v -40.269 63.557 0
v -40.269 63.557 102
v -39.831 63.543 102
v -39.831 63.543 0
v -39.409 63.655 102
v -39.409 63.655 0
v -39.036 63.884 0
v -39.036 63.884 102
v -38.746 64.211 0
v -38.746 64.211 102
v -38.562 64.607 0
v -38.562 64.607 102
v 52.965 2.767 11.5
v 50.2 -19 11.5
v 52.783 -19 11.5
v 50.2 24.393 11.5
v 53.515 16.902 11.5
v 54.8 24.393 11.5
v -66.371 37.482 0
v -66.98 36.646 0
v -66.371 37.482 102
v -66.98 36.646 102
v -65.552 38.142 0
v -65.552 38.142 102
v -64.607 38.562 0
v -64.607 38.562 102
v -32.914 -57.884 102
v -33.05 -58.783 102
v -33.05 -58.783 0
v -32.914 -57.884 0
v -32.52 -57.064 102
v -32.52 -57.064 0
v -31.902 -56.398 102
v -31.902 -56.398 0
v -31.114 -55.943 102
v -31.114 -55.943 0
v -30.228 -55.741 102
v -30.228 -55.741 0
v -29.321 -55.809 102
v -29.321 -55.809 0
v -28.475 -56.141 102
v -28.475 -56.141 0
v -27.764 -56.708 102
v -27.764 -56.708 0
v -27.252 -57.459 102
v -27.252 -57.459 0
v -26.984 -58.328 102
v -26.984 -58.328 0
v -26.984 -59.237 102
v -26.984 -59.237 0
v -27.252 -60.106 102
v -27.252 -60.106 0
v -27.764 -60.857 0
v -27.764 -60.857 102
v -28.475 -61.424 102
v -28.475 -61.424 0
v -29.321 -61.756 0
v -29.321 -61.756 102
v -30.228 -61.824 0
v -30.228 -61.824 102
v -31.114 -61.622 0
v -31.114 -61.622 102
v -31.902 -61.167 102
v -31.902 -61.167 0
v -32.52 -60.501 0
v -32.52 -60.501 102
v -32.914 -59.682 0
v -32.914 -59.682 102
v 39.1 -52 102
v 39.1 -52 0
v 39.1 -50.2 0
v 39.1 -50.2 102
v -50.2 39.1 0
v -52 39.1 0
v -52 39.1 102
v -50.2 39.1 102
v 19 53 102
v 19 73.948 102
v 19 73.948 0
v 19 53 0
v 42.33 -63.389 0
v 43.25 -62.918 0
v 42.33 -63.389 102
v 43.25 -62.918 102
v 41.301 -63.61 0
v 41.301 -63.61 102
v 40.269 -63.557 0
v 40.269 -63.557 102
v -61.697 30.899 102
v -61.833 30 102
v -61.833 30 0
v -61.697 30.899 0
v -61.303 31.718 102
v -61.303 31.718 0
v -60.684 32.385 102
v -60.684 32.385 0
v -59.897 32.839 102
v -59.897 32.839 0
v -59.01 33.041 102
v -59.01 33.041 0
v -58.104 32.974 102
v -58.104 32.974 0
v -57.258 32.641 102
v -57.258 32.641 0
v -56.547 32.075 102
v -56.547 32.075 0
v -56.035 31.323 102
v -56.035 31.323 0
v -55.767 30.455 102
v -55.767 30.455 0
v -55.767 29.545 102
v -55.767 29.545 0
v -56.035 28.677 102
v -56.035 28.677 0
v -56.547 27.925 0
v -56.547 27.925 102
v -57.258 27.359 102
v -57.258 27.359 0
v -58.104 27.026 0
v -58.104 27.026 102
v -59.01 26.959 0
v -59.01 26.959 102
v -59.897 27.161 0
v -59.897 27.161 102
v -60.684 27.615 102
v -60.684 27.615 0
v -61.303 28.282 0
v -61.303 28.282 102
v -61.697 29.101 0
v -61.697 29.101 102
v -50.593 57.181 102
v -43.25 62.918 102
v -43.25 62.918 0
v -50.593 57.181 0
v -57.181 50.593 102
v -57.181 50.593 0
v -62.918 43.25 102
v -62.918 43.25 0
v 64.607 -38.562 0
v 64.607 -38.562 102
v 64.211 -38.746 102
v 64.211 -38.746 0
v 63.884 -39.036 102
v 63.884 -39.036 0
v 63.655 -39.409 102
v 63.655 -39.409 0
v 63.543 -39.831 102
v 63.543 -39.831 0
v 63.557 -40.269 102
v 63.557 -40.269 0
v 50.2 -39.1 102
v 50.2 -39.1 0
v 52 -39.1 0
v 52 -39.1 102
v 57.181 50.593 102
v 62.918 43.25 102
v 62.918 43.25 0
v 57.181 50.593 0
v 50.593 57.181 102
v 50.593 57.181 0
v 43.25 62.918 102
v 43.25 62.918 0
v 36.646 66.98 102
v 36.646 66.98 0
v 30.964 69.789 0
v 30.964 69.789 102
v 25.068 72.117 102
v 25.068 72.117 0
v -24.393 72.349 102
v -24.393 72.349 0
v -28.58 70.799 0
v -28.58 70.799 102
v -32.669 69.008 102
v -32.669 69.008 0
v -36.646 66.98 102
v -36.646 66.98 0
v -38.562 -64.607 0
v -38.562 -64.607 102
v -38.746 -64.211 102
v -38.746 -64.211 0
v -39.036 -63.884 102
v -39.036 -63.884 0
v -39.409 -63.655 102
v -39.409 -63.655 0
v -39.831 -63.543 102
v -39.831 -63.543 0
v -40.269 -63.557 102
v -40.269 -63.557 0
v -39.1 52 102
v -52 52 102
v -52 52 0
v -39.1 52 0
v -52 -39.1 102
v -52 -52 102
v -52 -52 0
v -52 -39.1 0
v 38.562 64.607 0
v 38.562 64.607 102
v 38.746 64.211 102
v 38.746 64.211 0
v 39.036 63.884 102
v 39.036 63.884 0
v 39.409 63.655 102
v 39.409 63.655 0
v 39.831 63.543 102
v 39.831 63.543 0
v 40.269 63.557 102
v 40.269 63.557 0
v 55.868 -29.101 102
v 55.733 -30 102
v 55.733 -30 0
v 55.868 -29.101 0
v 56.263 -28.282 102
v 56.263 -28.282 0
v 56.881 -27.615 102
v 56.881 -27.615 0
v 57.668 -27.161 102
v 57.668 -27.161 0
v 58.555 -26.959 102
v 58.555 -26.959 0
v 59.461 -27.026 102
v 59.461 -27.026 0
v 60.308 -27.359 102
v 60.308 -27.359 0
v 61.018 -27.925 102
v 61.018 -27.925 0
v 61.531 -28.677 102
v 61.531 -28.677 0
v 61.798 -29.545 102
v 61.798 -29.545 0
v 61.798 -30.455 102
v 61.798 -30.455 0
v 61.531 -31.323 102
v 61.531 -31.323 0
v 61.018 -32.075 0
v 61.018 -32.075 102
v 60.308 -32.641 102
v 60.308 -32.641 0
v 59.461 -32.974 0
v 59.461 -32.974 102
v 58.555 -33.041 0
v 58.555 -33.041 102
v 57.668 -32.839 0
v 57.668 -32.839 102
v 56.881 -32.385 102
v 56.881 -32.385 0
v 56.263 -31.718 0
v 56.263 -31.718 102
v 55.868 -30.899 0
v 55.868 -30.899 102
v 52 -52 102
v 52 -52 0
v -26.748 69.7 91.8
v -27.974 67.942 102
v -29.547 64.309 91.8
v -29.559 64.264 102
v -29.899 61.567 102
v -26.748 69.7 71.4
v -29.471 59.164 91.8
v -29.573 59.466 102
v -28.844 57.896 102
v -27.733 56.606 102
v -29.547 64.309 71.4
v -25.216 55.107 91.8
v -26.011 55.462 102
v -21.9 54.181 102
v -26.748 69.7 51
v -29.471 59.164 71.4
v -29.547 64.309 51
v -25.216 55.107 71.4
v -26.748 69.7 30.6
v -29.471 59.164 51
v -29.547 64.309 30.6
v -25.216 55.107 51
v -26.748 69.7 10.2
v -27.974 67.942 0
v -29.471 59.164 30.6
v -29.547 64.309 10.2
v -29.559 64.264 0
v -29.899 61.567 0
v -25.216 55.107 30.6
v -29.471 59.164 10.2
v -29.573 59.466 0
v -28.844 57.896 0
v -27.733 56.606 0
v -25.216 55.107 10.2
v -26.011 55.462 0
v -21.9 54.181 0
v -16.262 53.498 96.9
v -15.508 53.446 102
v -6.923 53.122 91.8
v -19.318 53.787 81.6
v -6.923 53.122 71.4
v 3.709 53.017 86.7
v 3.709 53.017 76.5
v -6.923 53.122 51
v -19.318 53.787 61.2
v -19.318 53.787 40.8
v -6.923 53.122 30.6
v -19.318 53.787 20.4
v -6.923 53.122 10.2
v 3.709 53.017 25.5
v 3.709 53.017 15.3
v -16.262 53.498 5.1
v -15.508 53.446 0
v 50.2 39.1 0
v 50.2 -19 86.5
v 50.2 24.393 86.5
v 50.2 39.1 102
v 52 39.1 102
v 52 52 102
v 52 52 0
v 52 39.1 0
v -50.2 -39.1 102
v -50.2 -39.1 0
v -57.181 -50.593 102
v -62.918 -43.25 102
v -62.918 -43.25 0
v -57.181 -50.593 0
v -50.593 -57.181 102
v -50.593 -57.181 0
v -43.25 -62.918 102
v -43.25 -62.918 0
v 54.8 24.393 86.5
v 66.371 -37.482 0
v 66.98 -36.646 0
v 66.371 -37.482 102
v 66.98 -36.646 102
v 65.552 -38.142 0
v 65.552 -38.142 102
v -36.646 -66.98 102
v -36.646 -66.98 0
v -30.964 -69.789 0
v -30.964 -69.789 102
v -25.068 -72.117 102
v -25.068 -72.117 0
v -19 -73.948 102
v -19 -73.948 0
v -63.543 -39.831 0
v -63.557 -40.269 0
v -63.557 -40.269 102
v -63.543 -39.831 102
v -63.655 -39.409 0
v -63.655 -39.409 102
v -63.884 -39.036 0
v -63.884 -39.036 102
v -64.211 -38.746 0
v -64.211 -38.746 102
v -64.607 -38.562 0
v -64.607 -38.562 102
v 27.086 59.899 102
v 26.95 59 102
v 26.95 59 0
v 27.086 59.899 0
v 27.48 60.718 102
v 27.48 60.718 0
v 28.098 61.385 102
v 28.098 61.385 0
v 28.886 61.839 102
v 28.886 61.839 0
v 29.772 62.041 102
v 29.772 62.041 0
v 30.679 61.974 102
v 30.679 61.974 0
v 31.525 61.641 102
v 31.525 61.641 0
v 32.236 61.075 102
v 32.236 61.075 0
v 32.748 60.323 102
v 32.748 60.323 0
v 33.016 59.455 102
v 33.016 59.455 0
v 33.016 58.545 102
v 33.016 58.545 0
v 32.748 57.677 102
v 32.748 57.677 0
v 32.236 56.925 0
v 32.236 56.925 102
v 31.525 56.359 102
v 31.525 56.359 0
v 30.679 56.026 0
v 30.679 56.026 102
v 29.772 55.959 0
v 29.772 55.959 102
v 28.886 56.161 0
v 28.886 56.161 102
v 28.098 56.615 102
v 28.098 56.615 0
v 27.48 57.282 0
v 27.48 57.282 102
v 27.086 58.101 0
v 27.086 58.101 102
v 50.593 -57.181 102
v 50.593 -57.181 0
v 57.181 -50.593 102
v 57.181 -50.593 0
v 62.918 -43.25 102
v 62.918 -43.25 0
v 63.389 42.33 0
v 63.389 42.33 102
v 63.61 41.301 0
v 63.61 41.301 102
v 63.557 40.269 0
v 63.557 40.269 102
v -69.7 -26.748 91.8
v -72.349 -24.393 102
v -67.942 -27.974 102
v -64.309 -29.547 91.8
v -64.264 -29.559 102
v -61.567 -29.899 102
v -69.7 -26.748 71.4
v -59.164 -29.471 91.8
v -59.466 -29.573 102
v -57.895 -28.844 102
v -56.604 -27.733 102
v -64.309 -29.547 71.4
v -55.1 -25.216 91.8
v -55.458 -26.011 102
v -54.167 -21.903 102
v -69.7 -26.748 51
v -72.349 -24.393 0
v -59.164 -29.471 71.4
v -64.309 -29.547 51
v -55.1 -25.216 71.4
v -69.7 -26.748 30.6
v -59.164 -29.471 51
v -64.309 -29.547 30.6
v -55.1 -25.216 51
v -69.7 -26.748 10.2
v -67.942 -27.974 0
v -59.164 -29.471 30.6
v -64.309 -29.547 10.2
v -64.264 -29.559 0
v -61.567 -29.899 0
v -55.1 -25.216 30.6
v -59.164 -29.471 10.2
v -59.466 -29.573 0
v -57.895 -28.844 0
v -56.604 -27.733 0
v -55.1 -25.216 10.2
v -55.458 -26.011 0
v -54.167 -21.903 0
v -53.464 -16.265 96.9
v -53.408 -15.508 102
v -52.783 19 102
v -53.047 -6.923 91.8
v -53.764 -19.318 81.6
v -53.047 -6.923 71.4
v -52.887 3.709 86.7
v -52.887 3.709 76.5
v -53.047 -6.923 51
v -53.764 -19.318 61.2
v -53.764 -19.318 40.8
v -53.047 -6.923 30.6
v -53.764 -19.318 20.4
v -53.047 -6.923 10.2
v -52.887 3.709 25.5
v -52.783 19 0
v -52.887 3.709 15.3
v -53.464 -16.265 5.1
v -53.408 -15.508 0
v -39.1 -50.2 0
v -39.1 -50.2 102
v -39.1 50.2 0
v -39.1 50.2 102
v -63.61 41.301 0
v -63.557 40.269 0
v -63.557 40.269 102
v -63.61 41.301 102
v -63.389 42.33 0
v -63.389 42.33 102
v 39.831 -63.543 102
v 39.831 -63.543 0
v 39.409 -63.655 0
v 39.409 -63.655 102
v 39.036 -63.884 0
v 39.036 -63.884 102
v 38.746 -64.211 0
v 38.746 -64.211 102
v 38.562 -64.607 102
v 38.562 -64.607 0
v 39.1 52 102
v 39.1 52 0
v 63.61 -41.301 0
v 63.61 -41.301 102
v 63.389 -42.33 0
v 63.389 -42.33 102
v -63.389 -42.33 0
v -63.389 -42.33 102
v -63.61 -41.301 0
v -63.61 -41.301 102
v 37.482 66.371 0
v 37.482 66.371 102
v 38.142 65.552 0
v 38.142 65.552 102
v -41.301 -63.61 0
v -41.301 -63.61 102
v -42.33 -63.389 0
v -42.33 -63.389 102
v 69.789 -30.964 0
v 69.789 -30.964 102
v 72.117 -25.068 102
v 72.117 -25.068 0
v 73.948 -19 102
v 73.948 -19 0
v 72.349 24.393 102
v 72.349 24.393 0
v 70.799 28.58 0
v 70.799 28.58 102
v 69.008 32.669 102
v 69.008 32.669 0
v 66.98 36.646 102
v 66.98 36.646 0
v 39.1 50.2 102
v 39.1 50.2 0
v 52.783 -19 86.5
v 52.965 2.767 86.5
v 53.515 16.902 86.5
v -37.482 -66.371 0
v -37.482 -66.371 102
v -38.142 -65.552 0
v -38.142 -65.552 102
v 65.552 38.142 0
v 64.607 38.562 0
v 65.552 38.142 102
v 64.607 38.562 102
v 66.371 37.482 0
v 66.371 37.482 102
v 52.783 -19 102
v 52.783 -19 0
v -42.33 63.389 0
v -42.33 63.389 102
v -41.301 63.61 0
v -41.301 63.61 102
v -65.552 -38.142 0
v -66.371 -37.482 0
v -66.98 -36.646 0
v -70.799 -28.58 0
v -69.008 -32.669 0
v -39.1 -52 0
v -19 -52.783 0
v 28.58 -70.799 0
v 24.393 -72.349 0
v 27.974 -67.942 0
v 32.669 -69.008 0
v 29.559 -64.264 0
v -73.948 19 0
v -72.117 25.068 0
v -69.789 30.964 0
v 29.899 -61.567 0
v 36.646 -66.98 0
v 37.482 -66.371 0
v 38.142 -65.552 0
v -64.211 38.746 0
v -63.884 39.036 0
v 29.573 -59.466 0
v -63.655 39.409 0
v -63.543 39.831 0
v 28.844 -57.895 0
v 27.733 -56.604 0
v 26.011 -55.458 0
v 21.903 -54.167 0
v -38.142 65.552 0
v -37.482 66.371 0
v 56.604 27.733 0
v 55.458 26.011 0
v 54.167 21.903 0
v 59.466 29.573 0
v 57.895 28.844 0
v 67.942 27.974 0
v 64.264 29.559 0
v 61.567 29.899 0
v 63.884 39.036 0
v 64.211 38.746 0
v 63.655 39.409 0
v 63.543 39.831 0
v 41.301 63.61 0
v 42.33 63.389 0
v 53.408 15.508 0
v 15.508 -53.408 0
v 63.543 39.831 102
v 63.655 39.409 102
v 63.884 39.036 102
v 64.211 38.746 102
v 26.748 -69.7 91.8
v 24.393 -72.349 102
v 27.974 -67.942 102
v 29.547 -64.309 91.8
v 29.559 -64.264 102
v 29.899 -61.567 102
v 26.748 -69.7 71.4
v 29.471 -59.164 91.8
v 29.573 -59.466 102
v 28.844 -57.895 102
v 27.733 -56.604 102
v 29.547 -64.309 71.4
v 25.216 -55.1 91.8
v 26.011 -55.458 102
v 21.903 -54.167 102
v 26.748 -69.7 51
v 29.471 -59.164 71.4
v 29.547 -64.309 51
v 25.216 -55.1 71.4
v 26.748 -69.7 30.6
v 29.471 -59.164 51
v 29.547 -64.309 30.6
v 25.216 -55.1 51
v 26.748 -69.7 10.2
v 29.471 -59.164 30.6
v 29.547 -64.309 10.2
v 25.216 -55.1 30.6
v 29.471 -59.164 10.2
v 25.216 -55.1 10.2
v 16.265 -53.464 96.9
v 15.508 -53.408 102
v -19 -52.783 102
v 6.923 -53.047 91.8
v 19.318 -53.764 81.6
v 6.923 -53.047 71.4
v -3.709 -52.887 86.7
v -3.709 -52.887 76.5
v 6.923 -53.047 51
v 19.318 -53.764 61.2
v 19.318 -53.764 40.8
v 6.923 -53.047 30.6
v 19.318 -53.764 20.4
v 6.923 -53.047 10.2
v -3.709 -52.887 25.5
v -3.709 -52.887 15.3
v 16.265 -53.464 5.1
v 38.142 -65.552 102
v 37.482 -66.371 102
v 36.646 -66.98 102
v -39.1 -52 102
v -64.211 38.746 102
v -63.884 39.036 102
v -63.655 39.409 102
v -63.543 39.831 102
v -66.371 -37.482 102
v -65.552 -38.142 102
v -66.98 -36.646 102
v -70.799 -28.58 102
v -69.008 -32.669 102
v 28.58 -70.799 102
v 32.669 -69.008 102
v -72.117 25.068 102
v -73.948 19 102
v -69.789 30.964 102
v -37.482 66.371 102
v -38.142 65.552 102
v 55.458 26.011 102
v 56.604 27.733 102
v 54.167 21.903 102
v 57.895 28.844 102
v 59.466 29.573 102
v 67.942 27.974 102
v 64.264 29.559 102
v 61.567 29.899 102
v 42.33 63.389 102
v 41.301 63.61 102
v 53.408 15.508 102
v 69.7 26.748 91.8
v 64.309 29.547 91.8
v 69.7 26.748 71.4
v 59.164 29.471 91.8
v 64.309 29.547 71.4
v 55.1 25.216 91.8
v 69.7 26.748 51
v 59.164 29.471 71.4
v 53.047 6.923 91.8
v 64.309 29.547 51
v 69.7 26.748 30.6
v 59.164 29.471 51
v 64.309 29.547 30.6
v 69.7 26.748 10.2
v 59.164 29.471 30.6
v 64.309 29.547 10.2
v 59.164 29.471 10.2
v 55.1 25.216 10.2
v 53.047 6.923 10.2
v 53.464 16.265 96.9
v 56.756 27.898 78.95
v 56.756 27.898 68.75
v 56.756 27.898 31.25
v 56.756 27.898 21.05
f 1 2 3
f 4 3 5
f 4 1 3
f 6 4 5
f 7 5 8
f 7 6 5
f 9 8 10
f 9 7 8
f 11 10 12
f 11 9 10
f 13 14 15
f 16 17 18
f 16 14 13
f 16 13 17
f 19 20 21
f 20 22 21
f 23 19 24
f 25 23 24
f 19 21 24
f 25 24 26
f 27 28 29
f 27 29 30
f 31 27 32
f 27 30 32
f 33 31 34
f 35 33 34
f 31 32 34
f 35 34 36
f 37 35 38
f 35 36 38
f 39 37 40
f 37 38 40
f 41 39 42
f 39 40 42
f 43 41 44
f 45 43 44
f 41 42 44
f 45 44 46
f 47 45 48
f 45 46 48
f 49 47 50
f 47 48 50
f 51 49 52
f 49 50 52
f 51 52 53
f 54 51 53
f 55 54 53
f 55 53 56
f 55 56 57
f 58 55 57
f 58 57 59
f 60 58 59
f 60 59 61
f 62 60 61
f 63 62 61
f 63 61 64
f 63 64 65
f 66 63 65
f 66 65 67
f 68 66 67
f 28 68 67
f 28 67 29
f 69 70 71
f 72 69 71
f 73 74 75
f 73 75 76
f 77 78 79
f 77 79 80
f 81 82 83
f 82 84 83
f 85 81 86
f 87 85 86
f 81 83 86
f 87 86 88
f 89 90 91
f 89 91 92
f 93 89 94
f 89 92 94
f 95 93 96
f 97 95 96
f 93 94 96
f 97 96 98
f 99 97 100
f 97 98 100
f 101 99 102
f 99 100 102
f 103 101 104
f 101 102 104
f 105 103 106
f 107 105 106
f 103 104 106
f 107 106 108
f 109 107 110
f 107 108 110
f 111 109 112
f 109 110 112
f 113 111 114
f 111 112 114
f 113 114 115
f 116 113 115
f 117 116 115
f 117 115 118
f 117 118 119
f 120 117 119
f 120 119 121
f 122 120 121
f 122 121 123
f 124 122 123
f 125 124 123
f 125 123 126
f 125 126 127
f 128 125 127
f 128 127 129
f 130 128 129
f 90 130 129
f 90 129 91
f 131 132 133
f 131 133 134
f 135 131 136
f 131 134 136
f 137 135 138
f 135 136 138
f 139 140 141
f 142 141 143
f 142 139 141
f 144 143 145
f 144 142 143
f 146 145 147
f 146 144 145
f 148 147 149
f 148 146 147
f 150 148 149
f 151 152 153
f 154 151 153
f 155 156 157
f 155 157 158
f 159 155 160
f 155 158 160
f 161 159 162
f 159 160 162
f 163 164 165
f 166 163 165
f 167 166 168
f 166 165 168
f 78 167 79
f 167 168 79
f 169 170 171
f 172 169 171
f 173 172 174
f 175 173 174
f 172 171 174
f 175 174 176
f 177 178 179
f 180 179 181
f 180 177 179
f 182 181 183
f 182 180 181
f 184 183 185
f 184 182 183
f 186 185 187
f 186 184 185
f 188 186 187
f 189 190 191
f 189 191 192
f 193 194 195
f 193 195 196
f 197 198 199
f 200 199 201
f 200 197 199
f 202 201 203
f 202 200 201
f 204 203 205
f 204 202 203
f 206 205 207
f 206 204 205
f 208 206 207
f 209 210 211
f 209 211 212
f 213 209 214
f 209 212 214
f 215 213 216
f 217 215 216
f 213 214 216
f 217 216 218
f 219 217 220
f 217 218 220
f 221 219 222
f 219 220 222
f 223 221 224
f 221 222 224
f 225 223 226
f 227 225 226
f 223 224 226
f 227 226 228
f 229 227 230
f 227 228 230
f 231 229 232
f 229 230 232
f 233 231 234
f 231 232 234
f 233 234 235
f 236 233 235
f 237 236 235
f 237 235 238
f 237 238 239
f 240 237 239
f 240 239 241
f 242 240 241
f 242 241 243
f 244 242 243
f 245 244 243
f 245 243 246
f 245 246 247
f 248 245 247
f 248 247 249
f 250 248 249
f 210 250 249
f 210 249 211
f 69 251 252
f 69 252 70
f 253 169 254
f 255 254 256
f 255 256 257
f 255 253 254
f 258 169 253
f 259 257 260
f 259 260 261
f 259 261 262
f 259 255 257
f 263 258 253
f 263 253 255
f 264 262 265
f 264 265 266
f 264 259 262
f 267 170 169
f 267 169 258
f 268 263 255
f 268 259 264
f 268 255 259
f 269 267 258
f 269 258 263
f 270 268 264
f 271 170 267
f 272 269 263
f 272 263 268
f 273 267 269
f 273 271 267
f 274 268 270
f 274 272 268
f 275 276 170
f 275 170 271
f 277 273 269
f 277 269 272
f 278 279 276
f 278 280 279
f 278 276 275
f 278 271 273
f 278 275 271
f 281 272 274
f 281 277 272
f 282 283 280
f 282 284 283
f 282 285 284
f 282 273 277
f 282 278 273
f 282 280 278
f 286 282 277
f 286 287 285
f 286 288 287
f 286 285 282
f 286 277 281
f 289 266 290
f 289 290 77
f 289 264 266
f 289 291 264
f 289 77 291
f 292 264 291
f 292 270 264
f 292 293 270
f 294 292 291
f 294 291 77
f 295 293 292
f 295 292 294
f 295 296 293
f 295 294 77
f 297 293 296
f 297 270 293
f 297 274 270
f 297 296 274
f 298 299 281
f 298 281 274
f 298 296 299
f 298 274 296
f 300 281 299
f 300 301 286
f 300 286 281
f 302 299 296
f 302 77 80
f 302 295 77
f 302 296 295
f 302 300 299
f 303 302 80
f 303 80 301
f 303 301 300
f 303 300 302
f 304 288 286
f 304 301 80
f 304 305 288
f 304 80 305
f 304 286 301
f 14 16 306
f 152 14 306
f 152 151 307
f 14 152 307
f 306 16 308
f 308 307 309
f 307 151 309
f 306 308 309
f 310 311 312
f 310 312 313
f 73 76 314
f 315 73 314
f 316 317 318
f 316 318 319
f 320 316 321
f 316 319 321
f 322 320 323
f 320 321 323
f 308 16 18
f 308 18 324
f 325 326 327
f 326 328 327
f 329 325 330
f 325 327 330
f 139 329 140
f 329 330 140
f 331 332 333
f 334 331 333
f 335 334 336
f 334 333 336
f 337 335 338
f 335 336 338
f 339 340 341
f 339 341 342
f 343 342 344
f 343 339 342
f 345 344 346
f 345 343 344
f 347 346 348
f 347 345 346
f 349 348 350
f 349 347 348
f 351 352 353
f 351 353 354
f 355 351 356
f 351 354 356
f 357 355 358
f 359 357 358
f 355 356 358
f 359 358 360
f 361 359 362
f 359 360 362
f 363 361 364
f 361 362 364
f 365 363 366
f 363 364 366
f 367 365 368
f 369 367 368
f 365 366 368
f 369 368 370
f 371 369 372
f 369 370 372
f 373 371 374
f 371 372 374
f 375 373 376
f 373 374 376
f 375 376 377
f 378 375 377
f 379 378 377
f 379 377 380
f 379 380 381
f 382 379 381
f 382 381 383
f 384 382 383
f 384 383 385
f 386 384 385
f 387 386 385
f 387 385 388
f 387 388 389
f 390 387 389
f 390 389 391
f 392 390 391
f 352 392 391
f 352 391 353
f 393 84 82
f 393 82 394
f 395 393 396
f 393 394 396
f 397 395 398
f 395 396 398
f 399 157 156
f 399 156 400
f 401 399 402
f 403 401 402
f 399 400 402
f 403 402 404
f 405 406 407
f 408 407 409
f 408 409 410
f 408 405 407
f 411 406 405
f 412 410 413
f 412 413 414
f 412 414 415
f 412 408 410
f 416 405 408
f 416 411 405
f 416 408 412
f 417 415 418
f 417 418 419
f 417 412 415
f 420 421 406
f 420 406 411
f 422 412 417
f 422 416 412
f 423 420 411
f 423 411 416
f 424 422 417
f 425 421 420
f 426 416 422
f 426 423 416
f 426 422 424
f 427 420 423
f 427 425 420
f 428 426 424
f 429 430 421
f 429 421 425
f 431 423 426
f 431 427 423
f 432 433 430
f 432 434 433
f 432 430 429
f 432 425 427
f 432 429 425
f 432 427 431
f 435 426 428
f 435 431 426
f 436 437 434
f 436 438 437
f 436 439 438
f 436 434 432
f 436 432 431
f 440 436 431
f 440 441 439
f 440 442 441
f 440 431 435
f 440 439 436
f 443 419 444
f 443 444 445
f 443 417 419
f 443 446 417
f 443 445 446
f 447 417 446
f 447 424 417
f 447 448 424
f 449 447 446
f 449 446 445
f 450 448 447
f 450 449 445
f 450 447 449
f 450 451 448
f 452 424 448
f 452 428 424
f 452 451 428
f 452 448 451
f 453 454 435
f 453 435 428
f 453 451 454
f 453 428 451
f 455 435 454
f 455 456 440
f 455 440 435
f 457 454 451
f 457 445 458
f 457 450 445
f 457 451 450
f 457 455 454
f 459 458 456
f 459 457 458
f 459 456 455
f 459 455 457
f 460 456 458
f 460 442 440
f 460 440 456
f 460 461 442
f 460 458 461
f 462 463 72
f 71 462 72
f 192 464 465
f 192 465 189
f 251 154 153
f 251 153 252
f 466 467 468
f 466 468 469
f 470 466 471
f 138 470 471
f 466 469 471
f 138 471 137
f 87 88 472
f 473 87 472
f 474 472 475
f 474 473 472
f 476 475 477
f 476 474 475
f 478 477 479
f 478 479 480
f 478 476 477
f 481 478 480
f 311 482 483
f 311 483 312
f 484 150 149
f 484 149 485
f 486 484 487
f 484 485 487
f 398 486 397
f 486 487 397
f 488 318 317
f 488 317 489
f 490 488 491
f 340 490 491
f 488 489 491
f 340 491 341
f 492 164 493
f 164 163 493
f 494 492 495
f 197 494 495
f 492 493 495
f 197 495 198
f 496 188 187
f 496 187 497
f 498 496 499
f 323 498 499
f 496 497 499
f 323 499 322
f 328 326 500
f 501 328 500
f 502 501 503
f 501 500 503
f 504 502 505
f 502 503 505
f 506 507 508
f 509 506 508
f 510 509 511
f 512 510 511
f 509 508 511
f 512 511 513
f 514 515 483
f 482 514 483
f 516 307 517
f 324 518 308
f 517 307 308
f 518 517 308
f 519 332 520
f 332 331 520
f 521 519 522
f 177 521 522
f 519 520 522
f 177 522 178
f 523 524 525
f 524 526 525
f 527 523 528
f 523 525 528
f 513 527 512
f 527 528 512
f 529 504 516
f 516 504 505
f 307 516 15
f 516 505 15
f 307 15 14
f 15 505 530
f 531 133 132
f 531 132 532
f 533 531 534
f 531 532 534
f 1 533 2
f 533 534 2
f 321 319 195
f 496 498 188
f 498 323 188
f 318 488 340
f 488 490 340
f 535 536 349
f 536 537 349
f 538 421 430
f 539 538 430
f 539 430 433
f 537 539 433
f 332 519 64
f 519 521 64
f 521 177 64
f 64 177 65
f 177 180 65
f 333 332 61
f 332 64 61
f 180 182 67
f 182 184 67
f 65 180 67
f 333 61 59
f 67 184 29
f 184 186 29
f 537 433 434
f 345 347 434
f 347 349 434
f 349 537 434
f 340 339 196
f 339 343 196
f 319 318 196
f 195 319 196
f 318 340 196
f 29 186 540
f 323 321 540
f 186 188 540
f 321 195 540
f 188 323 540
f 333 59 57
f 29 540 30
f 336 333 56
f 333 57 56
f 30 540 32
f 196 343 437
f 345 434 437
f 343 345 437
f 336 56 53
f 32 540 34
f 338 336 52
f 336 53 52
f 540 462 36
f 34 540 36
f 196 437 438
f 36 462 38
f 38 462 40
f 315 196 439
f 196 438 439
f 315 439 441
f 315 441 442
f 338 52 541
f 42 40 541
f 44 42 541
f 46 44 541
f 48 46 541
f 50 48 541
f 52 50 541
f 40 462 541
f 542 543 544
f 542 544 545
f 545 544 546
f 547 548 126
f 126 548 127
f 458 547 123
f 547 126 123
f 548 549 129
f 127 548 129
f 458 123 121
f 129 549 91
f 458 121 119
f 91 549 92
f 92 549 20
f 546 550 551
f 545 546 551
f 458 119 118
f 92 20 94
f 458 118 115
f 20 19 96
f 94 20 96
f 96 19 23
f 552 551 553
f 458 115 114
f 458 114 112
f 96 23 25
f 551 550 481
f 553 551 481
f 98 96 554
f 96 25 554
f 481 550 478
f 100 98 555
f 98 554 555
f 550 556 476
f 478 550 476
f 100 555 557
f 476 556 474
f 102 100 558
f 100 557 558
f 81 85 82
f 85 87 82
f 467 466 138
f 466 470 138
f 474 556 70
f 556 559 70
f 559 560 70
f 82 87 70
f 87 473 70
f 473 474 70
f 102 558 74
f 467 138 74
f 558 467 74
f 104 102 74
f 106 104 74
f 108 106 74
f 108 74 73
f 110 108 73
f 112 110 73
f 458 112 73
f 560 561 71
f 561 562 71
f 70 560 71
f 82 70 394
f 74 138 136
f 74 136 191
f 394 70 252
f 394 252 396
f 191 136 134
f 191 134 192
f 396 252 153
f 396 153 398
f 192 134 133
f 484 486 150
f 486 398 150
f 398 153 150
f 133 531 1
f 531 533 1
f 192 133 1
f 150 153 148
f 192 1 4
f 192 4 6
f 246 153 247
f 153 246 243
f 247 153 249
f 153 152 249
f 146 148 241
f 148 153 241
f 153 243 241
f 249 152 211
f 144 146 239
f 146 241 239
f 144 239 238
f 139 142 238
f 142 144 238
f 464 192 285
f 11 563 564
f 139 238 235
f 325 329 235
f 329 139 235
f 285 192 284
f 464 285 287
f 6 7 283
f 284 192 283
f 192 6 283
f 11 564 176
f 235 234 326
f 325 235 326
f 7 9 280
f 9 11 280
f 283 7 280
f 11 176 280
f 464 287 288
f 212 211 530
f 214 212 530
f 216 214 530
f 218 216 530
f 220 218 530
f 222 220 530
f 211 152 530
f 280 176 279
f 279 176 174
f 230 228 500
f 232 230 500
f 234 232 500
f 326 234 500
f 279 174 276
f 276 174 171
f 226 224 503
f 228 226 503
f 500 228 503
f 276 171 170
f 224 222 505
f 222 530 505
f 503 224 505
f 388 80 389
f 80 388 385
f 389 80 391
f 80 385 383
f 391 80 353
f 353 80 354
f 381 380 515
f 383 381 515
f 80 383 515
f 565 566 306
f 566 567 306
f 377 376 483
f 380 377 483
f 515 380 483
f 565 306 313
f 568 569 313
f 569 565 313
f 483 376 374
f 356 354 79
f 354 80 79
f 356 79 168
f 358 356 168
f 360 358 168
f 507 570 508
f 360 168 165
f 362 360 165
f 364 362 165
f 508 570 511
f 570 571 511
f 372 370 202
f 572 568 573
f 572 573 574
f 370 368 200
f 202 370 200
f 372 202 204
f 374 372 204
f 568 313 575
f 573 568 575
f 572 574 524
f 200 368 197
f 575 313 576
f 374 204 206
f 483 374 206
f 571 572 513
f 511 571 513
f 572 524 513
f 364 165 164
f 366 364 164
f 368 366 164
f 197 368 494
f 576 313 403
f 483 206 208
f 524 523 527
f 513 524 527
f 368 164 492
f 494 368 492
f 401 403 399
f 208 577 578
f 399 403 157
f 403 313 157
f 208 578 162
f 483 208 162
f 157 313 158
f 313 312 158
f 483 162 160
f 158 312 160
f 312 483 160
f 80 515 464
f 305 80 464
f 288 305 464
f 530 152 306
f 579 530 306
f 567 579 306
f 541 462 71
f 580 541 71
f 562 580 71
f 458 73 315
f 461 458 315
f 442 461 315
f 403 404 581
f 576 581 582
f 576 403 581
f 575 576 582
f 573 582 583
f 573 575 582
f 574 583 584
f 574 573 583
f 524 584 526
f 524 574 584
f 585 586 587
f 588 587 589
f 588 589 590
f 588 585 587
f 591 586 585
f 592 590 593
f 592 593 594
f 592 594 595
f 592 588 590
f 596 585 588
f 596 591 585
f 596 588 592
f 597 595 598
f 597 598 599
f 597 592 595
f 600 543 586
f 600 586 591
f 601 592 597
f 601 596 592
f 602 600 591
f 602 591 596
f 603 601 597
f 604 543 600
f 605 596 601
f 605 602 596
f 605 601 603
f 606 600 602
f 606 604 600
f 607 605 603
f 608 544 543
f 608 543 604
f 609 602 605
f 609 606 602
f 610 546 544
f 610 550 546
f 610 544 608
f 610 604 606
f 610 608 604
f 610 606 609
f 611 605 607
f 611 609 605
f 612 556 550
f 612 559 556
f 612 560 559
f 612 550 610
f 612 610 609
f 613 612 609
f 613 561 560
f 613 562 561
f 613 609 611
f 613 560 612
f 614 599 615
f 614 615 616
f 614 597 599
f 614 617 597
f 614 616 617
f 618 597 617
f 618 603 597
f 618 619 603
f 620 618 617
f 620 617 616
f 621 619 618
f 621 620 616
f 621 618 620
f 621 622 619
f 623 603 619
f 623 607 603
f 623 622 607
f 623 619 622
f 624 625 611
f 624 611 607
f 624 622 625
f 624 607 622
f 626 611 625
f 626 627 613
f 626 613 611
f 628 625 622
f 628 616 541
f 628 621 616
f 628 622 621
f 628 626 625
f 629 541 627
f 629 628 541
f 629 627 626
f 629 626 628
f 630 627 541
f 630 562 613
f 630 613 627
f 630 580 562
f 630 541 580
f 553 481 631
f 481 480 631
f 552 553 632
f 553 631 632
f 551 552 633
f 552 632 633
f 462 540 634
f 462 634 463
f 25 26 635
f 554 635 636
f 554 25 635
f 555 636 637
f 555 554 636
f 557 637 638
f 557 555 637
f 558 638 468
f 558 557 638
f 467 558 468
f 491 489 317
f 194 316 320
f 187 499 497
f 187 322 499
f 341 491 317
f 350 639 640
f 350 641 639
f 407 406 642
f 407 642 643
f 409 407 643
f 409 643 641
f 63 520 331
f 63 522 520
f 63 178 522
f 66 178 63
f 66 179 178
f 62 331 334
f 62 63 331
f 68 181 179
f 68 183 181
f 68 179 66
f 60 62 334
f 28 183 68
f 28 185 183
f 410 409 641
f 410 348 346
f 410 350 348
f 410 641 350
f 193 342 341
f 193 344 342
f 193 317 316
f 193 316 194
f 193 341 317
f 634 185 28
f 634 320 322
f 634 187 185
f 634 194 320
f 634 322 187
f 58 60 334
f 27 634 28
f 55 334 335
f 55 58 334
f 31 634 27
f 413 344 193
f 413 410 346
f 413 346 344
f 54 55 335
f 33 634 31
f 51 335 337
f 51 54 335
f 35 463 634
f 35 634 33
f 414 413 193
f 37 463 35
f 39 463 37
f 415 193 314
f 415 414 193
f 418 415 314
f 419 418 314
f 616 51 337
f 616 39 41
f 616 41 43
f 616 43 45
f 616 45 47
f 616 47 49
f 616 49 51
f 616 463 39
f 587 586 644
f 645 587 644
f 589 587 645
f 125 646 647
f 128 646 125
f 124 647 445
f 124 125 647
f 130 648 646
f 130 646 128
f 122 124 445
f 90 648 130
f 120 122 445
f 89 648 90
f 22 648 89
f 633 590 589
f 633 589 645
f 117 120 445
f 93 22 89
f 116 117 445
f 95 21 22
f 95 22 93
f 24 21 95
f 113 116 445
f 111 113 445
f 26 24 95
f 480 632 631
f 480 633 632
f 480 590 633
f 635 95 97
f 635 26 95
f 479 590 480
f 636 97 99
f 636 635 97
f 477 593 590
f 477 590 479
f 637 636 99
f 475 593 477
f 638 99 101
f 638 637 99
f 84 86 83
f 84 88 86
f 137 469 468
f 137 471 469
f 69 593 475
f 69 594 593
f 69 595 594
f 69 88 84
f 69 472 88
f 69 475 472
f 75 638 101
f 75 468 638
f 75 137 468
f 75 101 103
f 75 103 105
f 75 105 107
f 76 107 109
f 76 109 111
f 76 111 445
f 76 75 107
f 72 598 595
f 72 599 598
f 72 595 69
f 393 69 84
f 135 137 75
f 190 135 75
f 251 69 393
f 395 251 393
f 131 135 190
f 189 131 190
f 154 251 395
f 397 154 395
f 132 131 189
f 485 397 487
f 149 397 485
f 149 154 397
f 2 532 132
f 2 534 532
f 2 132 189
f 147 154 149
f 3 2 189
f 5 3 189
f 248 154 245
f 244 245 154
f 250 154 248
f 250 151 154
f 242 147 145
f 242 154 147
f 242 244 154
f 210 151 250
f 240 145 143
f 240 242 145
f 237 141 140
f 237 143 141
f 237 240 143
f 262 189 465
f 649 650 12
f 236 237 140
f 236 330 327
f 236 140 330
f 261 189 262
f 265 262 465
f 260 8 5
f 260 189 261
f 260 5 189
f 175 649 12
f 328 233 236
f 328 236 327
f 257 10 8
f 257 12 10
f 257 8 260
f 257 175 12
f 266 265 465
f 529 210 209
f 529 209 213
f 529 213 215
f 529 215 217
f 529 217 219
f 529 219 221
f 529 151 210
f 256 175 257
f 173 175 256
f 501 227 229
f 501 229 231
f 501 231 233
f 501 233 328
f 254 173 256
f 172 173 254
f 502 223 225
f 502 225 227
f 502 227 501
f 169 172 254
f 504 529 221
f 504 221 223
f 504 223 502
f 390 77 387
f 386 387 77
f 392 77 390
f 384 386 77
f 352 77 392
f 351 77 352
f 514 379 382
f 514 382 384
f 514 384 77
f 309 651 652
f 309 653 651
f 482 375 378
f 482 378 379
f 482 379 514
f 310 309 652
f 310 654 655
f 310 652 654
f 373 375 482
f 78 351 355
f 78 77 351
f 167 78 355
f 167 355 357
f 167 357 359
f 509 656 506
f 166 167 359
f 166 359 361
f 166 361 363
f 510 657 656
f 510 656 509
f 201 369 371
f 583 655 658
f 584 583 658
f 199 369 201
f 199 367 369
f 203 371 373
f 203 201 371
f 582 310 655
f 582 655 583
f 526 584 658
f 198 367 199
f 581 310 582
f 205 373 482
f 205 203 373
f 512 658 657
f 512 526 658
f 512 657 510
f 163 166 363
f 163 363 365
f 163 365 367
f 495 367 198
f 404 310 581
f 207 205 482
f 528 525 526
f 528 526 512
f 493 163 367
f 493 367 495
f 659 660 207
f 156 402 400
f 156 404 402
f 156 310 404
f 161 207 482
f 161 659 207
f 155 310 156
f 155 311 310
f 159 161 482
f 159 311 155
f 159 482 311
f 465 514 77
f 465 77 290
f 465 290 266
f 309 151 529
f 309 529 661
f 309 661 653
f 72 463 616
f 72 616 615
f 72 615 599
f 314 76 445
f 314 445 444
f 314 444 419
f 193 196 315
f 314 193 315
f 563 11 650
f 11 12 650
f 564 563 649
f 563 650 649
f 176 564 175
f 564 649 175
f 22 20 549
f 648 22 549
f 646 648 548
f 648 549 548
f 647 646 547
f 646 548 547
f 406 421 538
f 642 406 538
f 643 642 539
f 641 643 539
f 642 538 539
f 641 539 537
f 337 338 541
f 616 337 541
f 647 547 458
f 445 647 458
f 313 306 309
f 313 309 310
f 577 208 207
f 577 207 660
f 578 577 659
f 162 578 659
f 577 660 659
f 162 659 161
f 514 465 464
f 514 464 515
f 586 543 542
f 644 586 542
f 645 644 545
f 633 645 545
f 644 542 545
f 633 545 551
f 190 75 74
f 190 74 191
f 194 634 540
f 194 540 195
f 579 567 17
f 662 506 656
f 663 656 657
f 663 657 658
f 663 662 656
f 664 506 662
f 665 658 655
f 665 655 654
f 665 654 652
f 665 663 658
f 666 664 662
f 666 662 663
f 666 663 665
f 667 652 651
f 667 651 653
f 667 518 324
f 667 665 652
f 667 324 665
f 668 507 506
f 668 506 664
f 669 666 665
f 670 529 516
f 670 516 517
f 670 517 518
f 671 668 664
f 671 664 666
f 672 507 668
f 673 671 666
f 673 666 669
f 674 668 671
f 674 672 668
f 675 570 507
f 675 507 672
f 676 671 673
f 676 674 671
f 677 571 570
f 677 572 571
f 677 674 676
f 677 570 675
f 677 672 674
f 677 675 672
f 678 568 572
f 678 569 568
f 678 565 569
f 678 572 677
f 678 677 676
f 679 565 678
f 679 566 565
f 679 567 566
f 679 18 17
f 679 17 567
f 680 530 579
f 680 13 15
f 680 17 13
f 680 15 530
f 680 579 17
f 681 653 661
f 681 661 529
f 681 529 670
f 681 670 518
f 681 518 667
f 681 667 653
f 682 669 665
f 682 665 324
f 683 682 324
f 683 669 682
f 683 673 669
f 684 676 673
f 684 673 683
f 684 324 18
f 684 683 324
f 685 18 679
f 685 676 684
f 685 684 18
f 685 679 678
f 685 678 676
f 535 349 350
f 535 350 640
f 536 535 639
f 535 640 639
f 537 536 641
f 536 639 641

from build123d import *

# Parameters (mm, degrees)
BOSS_EXTRUDE3_OUTLINE_R = 3
BOSS_EXTRUDE3_DEPTH     = 102
CUT_EXTRUDE1_DEPTH      = 102
CUT_EXTRUDE2_DEPTH      = 102
SKETCH4_W               = 0.4
SKETCH4_H               = 1.8
SKETCH4_W_2             = 1.8
SKETCH4_H_2             = 0.4
BOSS_EXTRUDE4_DEPTH     = 102
SKETCH5_W               = 75
SKETCH5_H               = 43.392810524
CUT_EXTRUDE6_DEPTH      = 10
SKETCH7_R               = 3.05
CUT_EXTRUDE9_DEPTH      = 147.084376475
CUT_EXTRUDE8_START      = -102
CUT_EXTRUDE8_DEPTH      = 102
FILLET1_R               = 4


# Read off the part's stored shape, not the designer's step: Boss-Extrude3
with BuildPart() as part:
    # Boss-Extrude3 outline → Boss-Extrude3 (new body)
    with BuildSketch(Plane.XY):
        with BuildLine():
            add(Edge.make_bspline(
                [(24.392810524, -72.348554199), (27.040667073, -69.541086329), (29.089162938, -67.428574969), (30.241441862, -64.355831171), (31.073643307, -60.963009895), (30.561519341, -59.042545022), (29.217193929, -56.673971678), (27.488775543, -54.241382838), (25.105954954, -53), (17.37432721, -53), (-19, -52.782560411)],
                knots=[0, 0, 0, 0, 0, 0, 0, 0, 0, 0, 0, 1, 1, 1, 1, 1, 1, 1, 1, 1, 1, 1], degree=10))
            ThreePointArc((24.392810524, -72.348554199), (55.939709188, -51.962211615), (73.948106805, -19))
            Line((73.948106805, -19), (52.782560411, -19))
            add(Edge.make_bspline(
                [(72.348554199, 24.392810524), (69.541086329, 27.040667073), (67.428574969, 29.089162938), (64.355831171, 30.241441862), (60.963009895, 31.073643307), (59.042545022, 30.561519341), (56.673971678, 29.217193929), (54.241382838, 27.488775543), (53, 25.105954954), (53, 17.37432721), (52.782560411, -19)],
                knots=[0, 0, 0, 0, 0, 0, 0, 0, 0, 0, 0, 1, 1, 1, 1, 1, 1, 1, 1, 1, 1, 1], degree=10))
            ThreePointArc((72.348554199, 24.392810524), (51.962211615, 55.939709188), (19, 73.948106805))
            Line((19, 73.948106805), (19, 53))
            add(Edge.make_bspline(
                [(-24.392810524, 72.348554199), (-27.040667073, 69.541086329), (-29.089162938, 67.428574969), (-30.241441862, 64.355831171), (-31.073643307, 60.963009895), (-30.561519341, 59.042545022), (-29.217193929, 56.673971678), (-27.488775543, 54.241382838), (-25.105954954, 53), (-17.37432721, 53), (19, 53)],
                knots=[0, 0, 0, 0, 0, 0, 0, 0, 0, 0, 0, 1, 1, 1, 1, 1, 1, 1, 1, 1, 1, 1], degree=10))
            ThreePointArc((-24.392810524, 72.348554199), (-55.939709188, 51.962211615), (-73.948106805, 19))
            Line((-73.948106805, 19), (-52.782560411, 19))
            add(Edge.make_bspline(
                [(-72.348554199, -24.392810524), (-69.541086329, -27.040667073), (-67.428574969, -29.089162938), (-64.355831171, -30.241441862), (-60.963009895, -31.073643307), (-59.042545022, -30.561519341), (-56.673971678, -29.217193929), (-54.241382838, -27.488775543), (-53, -25.105954954), (-53, -17.37432721), (-52.782560411, 19)],
                knots=[0, 0, 0, 0, 0, 0, 0, 0, 0, 0, 0, 1, 1, 1, 1, 1, 1, 1, 1, 1, 1, 1], degree=10))
            ThreePointArc((-72.348554199, -24.392810524), (-51.962211615, -55.939709188), (-19, -73.948106805))
            Line((-19, -73.948106805), (-19, -52.782560411))
        make_face()
        with Locations((-30, -58.782560411)):
            Circle(BOSS_EXTRUDE3_OUTLINE_R, mode=Mode.SUBTRACT)
        with Locations((58.782560411, -30)):
            Circle(BOSS_EXTRUDE3_OUTLINE_R, mode=Mode.SUBTRACT)
        with Locations((-58.782560411, 30)):
            Circle(BOSS_EXTRUDE3_OUTLINE_R, mode=Mode.SUBTRACT)
        Polygon((-38.9, -51.6), (-51.6, -51.6), (-51.6, -38.9), (-50, -38.9), (-50, 38.9), (-51.6, 38.9), (-51.6, 51.6), (-38.9, 51.6), (-38.9, 50), (38.9, 50), (38.9, 51.6), (51.6, 51.6), (51.6, 38.9), (50, 38.9), (50, -38.9), (51.6, -38.9), (51.6, -51.6), (38.9, -51.6), (38.9, -50), (-38.9, -50), align=None, mode=Mode.SUBTRACT)
        with Locations((30, 59)):
            Circle(BOSS_EXTRUDE3_OUTLINE_R, mode=Mode.SUBTRACT)
    extrude(amount=BOSS_EXTRUDE3_DEPTH)

    # Sketch2 → Cut-Extrude1 (cut)
    with BuildSketch(Plane.XY.offset(102)):
        Polygon((51.8, -38.7), (50.2, -38.7), (50.2, 38.7), (51.8, 38.7), (51.8, 51.8), (38.7, 51.8), (38.7, 50.2), (-38.7, 50.2), (-38.7, 51.8), (-51.8, 51.8), (-51.8, 38.7), (-50.2, 38.7), (-50.2, -38.7), (-51.8, -38.7), (-51.8, -51.8), (-38.7, -51.8), (-38.7, -50.2), (38.7, -50.2), (38.7, -51.8), (51.8, -51.8), align=None)
        Polygon((51.6, -38.9), (50, -38.9), (50, 38.9), (51.6, 38.9), (51.6, 51.6), (38.9, 51.6), (38.9, 50), (-38.9, 50), (-38.9, 51.6), (-51.6, 51.6), (-51.6, 38.9), (-50, 38.9), (-50, -38.9), (-51.6, -38.9), (-51.6, -51.6), (-38.9, -51.6), (-38.9, -50), (38.9, -50), (38.9, -51.6), (51.6, -51.6), align=None, mode=Mode.SUBTRACT)
    extrude(amount=-CUT_EXTRUDE1_DEPTH, mode=Mode.SUBTRACT)

    # Sketch3 → Cut-Extrude2 (cut)
    with BuildSketch(Plane.XY.offset(102)):
        Polygon((-51.8, -51.8), (-38.7, -51.8), (-38.7, -52), (-52, -52), (-52, -38.7), (-51.8, -38.7), align=None)
        Polygon((38.7, -51.8), (51.8, -51.8), (51.8, -38.7), (52, -38.7), (52, -52), (38.7, -52), align=None)
        Polygon((51.8, 38.7), (51.8, 51.8), (38.7, 51.8), (38.7, 52), (52, 52), (52, 38.7), align=None)
        Polygon((-51.8, 51.8), (-51.8, 38.7), (-52, 38.7), (-52, 52), (-38.7, 52), (-38.7, 51.8), align=None)
    extrude(amount=-CUT_EXTRUDE2_DEPTH, mode=Mode.SUBTRACT)

    # Sketch4 → Boss-Extrude4 (add)
    with BuildSketch(Plane.XY.offset(102)):
        with Locations((-38.9, 51.1)):
            Rectangle(SKETCH4_W, SKETCH4_H)
        with Locations((-51.1, 38.9)):
            Rectangle(SKETCH4_W_2, SKETCH4_H_2)
        with Locations((38.9, 51.1)):
            Rectangle(SKETCH4_W, SKETCH4_H)
        with Locations((51.1, 38.9)):
            Rectangle(SKETCH4_W_2, SKETCH4_H_2)
        with Locations((38.9, -51.1)):
            Rectangle(SKETCH4_W, SKETCH4_H)
        with Locations((51.1, -38.9)):
            Rectangle(SKETCH4_W_2, SKETCH4_H_2)
        with Locations((-51.1, -38.9)):
            Rectangle(SKETCH4_W_2, SKETCH4_H_2)
        with Locations((-38.9, -51.1)):
            Rectangle(SKETCH4_W, SKETCH4_H)
    extrude(amount=-BOSS_EXTRUDE4_DEPTH)

    # Sketch5 → Cut-Extrude6 (cut)
    with BuildSketch(Plane.ZY.offset(-50.2)):
        with Locations((49, 2.696405262)):
            Rectangle(SKETCH5_W, SKETCH5_H)
    extrude(amount=-CUT_EXTRUDE6_DEPTH, mode=Mode.SUBTRACT)

    # Sketch7 → Cut-Extrude9 (cut, through all)
    with BuildSketch(Plane(origin=(0, 0, 0), x_dir=(-1, 0, 0), z_dir=(0, 0, -1))):
        with Locations((30, -58.782560411)):
            Circle(SKETCH7_R)
        with Locations((-58.782560411, -30)):
            Circle(SKETCH7_R)
        with Locations((58.782560411, 30)):
            Circle(SKETCH7_R)
        with Locations((-30, 59)):
            Circle(SKETCH7_R)
    extrude(amount=-CUT_EXTRUDE9_DEPTH, mode=Mode.SUBTRACT)

    # Sketch6 → Cut-Extrude8 (cut)
    with BuildSketch(Plane.XY.offset(102).offset(CUT_EXTRUDE8_START)):
        with BuildLine():
            ThreePointArc((-65.806507446, 38.714675225), (-63.755574673, 39.214145383), (-64.234874045, 41.269885588))
            ThreePointArc((-64.234874045, 41.269885588), (-65.0332415, 40), (-65.806507446, 38.714675225))
        make_face()
        with BuildLine():
            ThreePointArc((-38.714675225, 65.806507446), (-40, 65.0332415), (-41.269885588, 64.234874045))
            ThreePointArc((-41.269885588, 64.234874045), (-39.214145383, 63.755574673), (-38.714675225, 65.806507446))
        make_face()
        with BuildLine():
            ThreePointArc((41.269885588, 64.234874045), (40, 65.0332415), (38.714675225, 65.806507446))
            ThreePointArc((38.714675225, 65.806507446), (39.214145383, 63.755574673), (41.269885588, 64.234874045))
        make_face()
        with BuildLine():
            ThreePointArc((65.806507446, 38.714675225), (65.0332415, 40), (64.234874045, 41.269885588))
            ThreePointArc((64.234874045, 41.269885588), (63.755574673, 39.214145383), (65.806507446, 38.714675225))
        make_face()
        with BuildLine():
            ThreePointArc((65.806507446, -38.714675225), (63.755574673, -39.214145383), (64.234874045, -41.269885588))
            ThreePointArc((64.234874045, -41.269885588), (65.0332415, -40), (65.806507446, -38.714675225))
        make_face()
        with BuildLine():
            ThreePointArc((38.714675225, -65.806507446), (40, -65.0332415), (41.269885588, -64.234874045))
            ThreePointArc((41.269885588, -64.234874045), (39.214145383, -63.755574673), (38.714675225, -65.806507446))
        make_face()
        with BuildLine():
            ThreePointArc((-38.714675225, -65.806507446), (-39.214145383, -63.755574673), (-41.269885588, -64.234874045))
            ThreePointArc((-41.269885588, -64.234874045), (-40, -65.0332415), (-38.714675225, -65.806507446))
        make_face()
        with BuildLine():
            ThreePointArc((-65.806507446, -38.714675225), (-65.0332415, -40), (-64.234874045, -41.269885588))
            ThreePointArc((-64.234874045, -41.269885588), (-63.755574673, -39.214145383), (-65.806507446, -38.714675225))
        make_face()
    extrude(amount=CUT_EXTRUDE8_DEPTH, mode=Mode.SUBTRACT)

    # Fillet1
    fillet1_edges = [part.edges().sort_by_distance(p)[0] for p in [
        (-41.269885588, 64.234874045, 51),
        (-38.714675225, 65.806507446, 51),
        (41.269885588, 64.234874045, 51),
        (38.714675225, 65.806507446, 51),
        (64.234874045, 41.269885588, 51),
        (65.806507446, 38.714675225, 51),
        (64.234874045, -41.269885588, 51),
        (65.806507446, -38.714675225, 51),
        (41.269885588, -64.234874045, 51),
        (38.714675225, -65.806507446, 51),
        (-41.269885588, -64.234874045, 51),
        (-38.714675225, -65.806507446, 51),
        (-64.234874045, -41.269885588, 51),
        (-65.806507446, -38.714675225, 51),
        (-64.234874045, 41.269885588, 51),
        (-65.806507446, 38.714675225, 51),
    ]]
    fillet(fillet1_edges, radius=FILLET1_R)


solid = part.part
